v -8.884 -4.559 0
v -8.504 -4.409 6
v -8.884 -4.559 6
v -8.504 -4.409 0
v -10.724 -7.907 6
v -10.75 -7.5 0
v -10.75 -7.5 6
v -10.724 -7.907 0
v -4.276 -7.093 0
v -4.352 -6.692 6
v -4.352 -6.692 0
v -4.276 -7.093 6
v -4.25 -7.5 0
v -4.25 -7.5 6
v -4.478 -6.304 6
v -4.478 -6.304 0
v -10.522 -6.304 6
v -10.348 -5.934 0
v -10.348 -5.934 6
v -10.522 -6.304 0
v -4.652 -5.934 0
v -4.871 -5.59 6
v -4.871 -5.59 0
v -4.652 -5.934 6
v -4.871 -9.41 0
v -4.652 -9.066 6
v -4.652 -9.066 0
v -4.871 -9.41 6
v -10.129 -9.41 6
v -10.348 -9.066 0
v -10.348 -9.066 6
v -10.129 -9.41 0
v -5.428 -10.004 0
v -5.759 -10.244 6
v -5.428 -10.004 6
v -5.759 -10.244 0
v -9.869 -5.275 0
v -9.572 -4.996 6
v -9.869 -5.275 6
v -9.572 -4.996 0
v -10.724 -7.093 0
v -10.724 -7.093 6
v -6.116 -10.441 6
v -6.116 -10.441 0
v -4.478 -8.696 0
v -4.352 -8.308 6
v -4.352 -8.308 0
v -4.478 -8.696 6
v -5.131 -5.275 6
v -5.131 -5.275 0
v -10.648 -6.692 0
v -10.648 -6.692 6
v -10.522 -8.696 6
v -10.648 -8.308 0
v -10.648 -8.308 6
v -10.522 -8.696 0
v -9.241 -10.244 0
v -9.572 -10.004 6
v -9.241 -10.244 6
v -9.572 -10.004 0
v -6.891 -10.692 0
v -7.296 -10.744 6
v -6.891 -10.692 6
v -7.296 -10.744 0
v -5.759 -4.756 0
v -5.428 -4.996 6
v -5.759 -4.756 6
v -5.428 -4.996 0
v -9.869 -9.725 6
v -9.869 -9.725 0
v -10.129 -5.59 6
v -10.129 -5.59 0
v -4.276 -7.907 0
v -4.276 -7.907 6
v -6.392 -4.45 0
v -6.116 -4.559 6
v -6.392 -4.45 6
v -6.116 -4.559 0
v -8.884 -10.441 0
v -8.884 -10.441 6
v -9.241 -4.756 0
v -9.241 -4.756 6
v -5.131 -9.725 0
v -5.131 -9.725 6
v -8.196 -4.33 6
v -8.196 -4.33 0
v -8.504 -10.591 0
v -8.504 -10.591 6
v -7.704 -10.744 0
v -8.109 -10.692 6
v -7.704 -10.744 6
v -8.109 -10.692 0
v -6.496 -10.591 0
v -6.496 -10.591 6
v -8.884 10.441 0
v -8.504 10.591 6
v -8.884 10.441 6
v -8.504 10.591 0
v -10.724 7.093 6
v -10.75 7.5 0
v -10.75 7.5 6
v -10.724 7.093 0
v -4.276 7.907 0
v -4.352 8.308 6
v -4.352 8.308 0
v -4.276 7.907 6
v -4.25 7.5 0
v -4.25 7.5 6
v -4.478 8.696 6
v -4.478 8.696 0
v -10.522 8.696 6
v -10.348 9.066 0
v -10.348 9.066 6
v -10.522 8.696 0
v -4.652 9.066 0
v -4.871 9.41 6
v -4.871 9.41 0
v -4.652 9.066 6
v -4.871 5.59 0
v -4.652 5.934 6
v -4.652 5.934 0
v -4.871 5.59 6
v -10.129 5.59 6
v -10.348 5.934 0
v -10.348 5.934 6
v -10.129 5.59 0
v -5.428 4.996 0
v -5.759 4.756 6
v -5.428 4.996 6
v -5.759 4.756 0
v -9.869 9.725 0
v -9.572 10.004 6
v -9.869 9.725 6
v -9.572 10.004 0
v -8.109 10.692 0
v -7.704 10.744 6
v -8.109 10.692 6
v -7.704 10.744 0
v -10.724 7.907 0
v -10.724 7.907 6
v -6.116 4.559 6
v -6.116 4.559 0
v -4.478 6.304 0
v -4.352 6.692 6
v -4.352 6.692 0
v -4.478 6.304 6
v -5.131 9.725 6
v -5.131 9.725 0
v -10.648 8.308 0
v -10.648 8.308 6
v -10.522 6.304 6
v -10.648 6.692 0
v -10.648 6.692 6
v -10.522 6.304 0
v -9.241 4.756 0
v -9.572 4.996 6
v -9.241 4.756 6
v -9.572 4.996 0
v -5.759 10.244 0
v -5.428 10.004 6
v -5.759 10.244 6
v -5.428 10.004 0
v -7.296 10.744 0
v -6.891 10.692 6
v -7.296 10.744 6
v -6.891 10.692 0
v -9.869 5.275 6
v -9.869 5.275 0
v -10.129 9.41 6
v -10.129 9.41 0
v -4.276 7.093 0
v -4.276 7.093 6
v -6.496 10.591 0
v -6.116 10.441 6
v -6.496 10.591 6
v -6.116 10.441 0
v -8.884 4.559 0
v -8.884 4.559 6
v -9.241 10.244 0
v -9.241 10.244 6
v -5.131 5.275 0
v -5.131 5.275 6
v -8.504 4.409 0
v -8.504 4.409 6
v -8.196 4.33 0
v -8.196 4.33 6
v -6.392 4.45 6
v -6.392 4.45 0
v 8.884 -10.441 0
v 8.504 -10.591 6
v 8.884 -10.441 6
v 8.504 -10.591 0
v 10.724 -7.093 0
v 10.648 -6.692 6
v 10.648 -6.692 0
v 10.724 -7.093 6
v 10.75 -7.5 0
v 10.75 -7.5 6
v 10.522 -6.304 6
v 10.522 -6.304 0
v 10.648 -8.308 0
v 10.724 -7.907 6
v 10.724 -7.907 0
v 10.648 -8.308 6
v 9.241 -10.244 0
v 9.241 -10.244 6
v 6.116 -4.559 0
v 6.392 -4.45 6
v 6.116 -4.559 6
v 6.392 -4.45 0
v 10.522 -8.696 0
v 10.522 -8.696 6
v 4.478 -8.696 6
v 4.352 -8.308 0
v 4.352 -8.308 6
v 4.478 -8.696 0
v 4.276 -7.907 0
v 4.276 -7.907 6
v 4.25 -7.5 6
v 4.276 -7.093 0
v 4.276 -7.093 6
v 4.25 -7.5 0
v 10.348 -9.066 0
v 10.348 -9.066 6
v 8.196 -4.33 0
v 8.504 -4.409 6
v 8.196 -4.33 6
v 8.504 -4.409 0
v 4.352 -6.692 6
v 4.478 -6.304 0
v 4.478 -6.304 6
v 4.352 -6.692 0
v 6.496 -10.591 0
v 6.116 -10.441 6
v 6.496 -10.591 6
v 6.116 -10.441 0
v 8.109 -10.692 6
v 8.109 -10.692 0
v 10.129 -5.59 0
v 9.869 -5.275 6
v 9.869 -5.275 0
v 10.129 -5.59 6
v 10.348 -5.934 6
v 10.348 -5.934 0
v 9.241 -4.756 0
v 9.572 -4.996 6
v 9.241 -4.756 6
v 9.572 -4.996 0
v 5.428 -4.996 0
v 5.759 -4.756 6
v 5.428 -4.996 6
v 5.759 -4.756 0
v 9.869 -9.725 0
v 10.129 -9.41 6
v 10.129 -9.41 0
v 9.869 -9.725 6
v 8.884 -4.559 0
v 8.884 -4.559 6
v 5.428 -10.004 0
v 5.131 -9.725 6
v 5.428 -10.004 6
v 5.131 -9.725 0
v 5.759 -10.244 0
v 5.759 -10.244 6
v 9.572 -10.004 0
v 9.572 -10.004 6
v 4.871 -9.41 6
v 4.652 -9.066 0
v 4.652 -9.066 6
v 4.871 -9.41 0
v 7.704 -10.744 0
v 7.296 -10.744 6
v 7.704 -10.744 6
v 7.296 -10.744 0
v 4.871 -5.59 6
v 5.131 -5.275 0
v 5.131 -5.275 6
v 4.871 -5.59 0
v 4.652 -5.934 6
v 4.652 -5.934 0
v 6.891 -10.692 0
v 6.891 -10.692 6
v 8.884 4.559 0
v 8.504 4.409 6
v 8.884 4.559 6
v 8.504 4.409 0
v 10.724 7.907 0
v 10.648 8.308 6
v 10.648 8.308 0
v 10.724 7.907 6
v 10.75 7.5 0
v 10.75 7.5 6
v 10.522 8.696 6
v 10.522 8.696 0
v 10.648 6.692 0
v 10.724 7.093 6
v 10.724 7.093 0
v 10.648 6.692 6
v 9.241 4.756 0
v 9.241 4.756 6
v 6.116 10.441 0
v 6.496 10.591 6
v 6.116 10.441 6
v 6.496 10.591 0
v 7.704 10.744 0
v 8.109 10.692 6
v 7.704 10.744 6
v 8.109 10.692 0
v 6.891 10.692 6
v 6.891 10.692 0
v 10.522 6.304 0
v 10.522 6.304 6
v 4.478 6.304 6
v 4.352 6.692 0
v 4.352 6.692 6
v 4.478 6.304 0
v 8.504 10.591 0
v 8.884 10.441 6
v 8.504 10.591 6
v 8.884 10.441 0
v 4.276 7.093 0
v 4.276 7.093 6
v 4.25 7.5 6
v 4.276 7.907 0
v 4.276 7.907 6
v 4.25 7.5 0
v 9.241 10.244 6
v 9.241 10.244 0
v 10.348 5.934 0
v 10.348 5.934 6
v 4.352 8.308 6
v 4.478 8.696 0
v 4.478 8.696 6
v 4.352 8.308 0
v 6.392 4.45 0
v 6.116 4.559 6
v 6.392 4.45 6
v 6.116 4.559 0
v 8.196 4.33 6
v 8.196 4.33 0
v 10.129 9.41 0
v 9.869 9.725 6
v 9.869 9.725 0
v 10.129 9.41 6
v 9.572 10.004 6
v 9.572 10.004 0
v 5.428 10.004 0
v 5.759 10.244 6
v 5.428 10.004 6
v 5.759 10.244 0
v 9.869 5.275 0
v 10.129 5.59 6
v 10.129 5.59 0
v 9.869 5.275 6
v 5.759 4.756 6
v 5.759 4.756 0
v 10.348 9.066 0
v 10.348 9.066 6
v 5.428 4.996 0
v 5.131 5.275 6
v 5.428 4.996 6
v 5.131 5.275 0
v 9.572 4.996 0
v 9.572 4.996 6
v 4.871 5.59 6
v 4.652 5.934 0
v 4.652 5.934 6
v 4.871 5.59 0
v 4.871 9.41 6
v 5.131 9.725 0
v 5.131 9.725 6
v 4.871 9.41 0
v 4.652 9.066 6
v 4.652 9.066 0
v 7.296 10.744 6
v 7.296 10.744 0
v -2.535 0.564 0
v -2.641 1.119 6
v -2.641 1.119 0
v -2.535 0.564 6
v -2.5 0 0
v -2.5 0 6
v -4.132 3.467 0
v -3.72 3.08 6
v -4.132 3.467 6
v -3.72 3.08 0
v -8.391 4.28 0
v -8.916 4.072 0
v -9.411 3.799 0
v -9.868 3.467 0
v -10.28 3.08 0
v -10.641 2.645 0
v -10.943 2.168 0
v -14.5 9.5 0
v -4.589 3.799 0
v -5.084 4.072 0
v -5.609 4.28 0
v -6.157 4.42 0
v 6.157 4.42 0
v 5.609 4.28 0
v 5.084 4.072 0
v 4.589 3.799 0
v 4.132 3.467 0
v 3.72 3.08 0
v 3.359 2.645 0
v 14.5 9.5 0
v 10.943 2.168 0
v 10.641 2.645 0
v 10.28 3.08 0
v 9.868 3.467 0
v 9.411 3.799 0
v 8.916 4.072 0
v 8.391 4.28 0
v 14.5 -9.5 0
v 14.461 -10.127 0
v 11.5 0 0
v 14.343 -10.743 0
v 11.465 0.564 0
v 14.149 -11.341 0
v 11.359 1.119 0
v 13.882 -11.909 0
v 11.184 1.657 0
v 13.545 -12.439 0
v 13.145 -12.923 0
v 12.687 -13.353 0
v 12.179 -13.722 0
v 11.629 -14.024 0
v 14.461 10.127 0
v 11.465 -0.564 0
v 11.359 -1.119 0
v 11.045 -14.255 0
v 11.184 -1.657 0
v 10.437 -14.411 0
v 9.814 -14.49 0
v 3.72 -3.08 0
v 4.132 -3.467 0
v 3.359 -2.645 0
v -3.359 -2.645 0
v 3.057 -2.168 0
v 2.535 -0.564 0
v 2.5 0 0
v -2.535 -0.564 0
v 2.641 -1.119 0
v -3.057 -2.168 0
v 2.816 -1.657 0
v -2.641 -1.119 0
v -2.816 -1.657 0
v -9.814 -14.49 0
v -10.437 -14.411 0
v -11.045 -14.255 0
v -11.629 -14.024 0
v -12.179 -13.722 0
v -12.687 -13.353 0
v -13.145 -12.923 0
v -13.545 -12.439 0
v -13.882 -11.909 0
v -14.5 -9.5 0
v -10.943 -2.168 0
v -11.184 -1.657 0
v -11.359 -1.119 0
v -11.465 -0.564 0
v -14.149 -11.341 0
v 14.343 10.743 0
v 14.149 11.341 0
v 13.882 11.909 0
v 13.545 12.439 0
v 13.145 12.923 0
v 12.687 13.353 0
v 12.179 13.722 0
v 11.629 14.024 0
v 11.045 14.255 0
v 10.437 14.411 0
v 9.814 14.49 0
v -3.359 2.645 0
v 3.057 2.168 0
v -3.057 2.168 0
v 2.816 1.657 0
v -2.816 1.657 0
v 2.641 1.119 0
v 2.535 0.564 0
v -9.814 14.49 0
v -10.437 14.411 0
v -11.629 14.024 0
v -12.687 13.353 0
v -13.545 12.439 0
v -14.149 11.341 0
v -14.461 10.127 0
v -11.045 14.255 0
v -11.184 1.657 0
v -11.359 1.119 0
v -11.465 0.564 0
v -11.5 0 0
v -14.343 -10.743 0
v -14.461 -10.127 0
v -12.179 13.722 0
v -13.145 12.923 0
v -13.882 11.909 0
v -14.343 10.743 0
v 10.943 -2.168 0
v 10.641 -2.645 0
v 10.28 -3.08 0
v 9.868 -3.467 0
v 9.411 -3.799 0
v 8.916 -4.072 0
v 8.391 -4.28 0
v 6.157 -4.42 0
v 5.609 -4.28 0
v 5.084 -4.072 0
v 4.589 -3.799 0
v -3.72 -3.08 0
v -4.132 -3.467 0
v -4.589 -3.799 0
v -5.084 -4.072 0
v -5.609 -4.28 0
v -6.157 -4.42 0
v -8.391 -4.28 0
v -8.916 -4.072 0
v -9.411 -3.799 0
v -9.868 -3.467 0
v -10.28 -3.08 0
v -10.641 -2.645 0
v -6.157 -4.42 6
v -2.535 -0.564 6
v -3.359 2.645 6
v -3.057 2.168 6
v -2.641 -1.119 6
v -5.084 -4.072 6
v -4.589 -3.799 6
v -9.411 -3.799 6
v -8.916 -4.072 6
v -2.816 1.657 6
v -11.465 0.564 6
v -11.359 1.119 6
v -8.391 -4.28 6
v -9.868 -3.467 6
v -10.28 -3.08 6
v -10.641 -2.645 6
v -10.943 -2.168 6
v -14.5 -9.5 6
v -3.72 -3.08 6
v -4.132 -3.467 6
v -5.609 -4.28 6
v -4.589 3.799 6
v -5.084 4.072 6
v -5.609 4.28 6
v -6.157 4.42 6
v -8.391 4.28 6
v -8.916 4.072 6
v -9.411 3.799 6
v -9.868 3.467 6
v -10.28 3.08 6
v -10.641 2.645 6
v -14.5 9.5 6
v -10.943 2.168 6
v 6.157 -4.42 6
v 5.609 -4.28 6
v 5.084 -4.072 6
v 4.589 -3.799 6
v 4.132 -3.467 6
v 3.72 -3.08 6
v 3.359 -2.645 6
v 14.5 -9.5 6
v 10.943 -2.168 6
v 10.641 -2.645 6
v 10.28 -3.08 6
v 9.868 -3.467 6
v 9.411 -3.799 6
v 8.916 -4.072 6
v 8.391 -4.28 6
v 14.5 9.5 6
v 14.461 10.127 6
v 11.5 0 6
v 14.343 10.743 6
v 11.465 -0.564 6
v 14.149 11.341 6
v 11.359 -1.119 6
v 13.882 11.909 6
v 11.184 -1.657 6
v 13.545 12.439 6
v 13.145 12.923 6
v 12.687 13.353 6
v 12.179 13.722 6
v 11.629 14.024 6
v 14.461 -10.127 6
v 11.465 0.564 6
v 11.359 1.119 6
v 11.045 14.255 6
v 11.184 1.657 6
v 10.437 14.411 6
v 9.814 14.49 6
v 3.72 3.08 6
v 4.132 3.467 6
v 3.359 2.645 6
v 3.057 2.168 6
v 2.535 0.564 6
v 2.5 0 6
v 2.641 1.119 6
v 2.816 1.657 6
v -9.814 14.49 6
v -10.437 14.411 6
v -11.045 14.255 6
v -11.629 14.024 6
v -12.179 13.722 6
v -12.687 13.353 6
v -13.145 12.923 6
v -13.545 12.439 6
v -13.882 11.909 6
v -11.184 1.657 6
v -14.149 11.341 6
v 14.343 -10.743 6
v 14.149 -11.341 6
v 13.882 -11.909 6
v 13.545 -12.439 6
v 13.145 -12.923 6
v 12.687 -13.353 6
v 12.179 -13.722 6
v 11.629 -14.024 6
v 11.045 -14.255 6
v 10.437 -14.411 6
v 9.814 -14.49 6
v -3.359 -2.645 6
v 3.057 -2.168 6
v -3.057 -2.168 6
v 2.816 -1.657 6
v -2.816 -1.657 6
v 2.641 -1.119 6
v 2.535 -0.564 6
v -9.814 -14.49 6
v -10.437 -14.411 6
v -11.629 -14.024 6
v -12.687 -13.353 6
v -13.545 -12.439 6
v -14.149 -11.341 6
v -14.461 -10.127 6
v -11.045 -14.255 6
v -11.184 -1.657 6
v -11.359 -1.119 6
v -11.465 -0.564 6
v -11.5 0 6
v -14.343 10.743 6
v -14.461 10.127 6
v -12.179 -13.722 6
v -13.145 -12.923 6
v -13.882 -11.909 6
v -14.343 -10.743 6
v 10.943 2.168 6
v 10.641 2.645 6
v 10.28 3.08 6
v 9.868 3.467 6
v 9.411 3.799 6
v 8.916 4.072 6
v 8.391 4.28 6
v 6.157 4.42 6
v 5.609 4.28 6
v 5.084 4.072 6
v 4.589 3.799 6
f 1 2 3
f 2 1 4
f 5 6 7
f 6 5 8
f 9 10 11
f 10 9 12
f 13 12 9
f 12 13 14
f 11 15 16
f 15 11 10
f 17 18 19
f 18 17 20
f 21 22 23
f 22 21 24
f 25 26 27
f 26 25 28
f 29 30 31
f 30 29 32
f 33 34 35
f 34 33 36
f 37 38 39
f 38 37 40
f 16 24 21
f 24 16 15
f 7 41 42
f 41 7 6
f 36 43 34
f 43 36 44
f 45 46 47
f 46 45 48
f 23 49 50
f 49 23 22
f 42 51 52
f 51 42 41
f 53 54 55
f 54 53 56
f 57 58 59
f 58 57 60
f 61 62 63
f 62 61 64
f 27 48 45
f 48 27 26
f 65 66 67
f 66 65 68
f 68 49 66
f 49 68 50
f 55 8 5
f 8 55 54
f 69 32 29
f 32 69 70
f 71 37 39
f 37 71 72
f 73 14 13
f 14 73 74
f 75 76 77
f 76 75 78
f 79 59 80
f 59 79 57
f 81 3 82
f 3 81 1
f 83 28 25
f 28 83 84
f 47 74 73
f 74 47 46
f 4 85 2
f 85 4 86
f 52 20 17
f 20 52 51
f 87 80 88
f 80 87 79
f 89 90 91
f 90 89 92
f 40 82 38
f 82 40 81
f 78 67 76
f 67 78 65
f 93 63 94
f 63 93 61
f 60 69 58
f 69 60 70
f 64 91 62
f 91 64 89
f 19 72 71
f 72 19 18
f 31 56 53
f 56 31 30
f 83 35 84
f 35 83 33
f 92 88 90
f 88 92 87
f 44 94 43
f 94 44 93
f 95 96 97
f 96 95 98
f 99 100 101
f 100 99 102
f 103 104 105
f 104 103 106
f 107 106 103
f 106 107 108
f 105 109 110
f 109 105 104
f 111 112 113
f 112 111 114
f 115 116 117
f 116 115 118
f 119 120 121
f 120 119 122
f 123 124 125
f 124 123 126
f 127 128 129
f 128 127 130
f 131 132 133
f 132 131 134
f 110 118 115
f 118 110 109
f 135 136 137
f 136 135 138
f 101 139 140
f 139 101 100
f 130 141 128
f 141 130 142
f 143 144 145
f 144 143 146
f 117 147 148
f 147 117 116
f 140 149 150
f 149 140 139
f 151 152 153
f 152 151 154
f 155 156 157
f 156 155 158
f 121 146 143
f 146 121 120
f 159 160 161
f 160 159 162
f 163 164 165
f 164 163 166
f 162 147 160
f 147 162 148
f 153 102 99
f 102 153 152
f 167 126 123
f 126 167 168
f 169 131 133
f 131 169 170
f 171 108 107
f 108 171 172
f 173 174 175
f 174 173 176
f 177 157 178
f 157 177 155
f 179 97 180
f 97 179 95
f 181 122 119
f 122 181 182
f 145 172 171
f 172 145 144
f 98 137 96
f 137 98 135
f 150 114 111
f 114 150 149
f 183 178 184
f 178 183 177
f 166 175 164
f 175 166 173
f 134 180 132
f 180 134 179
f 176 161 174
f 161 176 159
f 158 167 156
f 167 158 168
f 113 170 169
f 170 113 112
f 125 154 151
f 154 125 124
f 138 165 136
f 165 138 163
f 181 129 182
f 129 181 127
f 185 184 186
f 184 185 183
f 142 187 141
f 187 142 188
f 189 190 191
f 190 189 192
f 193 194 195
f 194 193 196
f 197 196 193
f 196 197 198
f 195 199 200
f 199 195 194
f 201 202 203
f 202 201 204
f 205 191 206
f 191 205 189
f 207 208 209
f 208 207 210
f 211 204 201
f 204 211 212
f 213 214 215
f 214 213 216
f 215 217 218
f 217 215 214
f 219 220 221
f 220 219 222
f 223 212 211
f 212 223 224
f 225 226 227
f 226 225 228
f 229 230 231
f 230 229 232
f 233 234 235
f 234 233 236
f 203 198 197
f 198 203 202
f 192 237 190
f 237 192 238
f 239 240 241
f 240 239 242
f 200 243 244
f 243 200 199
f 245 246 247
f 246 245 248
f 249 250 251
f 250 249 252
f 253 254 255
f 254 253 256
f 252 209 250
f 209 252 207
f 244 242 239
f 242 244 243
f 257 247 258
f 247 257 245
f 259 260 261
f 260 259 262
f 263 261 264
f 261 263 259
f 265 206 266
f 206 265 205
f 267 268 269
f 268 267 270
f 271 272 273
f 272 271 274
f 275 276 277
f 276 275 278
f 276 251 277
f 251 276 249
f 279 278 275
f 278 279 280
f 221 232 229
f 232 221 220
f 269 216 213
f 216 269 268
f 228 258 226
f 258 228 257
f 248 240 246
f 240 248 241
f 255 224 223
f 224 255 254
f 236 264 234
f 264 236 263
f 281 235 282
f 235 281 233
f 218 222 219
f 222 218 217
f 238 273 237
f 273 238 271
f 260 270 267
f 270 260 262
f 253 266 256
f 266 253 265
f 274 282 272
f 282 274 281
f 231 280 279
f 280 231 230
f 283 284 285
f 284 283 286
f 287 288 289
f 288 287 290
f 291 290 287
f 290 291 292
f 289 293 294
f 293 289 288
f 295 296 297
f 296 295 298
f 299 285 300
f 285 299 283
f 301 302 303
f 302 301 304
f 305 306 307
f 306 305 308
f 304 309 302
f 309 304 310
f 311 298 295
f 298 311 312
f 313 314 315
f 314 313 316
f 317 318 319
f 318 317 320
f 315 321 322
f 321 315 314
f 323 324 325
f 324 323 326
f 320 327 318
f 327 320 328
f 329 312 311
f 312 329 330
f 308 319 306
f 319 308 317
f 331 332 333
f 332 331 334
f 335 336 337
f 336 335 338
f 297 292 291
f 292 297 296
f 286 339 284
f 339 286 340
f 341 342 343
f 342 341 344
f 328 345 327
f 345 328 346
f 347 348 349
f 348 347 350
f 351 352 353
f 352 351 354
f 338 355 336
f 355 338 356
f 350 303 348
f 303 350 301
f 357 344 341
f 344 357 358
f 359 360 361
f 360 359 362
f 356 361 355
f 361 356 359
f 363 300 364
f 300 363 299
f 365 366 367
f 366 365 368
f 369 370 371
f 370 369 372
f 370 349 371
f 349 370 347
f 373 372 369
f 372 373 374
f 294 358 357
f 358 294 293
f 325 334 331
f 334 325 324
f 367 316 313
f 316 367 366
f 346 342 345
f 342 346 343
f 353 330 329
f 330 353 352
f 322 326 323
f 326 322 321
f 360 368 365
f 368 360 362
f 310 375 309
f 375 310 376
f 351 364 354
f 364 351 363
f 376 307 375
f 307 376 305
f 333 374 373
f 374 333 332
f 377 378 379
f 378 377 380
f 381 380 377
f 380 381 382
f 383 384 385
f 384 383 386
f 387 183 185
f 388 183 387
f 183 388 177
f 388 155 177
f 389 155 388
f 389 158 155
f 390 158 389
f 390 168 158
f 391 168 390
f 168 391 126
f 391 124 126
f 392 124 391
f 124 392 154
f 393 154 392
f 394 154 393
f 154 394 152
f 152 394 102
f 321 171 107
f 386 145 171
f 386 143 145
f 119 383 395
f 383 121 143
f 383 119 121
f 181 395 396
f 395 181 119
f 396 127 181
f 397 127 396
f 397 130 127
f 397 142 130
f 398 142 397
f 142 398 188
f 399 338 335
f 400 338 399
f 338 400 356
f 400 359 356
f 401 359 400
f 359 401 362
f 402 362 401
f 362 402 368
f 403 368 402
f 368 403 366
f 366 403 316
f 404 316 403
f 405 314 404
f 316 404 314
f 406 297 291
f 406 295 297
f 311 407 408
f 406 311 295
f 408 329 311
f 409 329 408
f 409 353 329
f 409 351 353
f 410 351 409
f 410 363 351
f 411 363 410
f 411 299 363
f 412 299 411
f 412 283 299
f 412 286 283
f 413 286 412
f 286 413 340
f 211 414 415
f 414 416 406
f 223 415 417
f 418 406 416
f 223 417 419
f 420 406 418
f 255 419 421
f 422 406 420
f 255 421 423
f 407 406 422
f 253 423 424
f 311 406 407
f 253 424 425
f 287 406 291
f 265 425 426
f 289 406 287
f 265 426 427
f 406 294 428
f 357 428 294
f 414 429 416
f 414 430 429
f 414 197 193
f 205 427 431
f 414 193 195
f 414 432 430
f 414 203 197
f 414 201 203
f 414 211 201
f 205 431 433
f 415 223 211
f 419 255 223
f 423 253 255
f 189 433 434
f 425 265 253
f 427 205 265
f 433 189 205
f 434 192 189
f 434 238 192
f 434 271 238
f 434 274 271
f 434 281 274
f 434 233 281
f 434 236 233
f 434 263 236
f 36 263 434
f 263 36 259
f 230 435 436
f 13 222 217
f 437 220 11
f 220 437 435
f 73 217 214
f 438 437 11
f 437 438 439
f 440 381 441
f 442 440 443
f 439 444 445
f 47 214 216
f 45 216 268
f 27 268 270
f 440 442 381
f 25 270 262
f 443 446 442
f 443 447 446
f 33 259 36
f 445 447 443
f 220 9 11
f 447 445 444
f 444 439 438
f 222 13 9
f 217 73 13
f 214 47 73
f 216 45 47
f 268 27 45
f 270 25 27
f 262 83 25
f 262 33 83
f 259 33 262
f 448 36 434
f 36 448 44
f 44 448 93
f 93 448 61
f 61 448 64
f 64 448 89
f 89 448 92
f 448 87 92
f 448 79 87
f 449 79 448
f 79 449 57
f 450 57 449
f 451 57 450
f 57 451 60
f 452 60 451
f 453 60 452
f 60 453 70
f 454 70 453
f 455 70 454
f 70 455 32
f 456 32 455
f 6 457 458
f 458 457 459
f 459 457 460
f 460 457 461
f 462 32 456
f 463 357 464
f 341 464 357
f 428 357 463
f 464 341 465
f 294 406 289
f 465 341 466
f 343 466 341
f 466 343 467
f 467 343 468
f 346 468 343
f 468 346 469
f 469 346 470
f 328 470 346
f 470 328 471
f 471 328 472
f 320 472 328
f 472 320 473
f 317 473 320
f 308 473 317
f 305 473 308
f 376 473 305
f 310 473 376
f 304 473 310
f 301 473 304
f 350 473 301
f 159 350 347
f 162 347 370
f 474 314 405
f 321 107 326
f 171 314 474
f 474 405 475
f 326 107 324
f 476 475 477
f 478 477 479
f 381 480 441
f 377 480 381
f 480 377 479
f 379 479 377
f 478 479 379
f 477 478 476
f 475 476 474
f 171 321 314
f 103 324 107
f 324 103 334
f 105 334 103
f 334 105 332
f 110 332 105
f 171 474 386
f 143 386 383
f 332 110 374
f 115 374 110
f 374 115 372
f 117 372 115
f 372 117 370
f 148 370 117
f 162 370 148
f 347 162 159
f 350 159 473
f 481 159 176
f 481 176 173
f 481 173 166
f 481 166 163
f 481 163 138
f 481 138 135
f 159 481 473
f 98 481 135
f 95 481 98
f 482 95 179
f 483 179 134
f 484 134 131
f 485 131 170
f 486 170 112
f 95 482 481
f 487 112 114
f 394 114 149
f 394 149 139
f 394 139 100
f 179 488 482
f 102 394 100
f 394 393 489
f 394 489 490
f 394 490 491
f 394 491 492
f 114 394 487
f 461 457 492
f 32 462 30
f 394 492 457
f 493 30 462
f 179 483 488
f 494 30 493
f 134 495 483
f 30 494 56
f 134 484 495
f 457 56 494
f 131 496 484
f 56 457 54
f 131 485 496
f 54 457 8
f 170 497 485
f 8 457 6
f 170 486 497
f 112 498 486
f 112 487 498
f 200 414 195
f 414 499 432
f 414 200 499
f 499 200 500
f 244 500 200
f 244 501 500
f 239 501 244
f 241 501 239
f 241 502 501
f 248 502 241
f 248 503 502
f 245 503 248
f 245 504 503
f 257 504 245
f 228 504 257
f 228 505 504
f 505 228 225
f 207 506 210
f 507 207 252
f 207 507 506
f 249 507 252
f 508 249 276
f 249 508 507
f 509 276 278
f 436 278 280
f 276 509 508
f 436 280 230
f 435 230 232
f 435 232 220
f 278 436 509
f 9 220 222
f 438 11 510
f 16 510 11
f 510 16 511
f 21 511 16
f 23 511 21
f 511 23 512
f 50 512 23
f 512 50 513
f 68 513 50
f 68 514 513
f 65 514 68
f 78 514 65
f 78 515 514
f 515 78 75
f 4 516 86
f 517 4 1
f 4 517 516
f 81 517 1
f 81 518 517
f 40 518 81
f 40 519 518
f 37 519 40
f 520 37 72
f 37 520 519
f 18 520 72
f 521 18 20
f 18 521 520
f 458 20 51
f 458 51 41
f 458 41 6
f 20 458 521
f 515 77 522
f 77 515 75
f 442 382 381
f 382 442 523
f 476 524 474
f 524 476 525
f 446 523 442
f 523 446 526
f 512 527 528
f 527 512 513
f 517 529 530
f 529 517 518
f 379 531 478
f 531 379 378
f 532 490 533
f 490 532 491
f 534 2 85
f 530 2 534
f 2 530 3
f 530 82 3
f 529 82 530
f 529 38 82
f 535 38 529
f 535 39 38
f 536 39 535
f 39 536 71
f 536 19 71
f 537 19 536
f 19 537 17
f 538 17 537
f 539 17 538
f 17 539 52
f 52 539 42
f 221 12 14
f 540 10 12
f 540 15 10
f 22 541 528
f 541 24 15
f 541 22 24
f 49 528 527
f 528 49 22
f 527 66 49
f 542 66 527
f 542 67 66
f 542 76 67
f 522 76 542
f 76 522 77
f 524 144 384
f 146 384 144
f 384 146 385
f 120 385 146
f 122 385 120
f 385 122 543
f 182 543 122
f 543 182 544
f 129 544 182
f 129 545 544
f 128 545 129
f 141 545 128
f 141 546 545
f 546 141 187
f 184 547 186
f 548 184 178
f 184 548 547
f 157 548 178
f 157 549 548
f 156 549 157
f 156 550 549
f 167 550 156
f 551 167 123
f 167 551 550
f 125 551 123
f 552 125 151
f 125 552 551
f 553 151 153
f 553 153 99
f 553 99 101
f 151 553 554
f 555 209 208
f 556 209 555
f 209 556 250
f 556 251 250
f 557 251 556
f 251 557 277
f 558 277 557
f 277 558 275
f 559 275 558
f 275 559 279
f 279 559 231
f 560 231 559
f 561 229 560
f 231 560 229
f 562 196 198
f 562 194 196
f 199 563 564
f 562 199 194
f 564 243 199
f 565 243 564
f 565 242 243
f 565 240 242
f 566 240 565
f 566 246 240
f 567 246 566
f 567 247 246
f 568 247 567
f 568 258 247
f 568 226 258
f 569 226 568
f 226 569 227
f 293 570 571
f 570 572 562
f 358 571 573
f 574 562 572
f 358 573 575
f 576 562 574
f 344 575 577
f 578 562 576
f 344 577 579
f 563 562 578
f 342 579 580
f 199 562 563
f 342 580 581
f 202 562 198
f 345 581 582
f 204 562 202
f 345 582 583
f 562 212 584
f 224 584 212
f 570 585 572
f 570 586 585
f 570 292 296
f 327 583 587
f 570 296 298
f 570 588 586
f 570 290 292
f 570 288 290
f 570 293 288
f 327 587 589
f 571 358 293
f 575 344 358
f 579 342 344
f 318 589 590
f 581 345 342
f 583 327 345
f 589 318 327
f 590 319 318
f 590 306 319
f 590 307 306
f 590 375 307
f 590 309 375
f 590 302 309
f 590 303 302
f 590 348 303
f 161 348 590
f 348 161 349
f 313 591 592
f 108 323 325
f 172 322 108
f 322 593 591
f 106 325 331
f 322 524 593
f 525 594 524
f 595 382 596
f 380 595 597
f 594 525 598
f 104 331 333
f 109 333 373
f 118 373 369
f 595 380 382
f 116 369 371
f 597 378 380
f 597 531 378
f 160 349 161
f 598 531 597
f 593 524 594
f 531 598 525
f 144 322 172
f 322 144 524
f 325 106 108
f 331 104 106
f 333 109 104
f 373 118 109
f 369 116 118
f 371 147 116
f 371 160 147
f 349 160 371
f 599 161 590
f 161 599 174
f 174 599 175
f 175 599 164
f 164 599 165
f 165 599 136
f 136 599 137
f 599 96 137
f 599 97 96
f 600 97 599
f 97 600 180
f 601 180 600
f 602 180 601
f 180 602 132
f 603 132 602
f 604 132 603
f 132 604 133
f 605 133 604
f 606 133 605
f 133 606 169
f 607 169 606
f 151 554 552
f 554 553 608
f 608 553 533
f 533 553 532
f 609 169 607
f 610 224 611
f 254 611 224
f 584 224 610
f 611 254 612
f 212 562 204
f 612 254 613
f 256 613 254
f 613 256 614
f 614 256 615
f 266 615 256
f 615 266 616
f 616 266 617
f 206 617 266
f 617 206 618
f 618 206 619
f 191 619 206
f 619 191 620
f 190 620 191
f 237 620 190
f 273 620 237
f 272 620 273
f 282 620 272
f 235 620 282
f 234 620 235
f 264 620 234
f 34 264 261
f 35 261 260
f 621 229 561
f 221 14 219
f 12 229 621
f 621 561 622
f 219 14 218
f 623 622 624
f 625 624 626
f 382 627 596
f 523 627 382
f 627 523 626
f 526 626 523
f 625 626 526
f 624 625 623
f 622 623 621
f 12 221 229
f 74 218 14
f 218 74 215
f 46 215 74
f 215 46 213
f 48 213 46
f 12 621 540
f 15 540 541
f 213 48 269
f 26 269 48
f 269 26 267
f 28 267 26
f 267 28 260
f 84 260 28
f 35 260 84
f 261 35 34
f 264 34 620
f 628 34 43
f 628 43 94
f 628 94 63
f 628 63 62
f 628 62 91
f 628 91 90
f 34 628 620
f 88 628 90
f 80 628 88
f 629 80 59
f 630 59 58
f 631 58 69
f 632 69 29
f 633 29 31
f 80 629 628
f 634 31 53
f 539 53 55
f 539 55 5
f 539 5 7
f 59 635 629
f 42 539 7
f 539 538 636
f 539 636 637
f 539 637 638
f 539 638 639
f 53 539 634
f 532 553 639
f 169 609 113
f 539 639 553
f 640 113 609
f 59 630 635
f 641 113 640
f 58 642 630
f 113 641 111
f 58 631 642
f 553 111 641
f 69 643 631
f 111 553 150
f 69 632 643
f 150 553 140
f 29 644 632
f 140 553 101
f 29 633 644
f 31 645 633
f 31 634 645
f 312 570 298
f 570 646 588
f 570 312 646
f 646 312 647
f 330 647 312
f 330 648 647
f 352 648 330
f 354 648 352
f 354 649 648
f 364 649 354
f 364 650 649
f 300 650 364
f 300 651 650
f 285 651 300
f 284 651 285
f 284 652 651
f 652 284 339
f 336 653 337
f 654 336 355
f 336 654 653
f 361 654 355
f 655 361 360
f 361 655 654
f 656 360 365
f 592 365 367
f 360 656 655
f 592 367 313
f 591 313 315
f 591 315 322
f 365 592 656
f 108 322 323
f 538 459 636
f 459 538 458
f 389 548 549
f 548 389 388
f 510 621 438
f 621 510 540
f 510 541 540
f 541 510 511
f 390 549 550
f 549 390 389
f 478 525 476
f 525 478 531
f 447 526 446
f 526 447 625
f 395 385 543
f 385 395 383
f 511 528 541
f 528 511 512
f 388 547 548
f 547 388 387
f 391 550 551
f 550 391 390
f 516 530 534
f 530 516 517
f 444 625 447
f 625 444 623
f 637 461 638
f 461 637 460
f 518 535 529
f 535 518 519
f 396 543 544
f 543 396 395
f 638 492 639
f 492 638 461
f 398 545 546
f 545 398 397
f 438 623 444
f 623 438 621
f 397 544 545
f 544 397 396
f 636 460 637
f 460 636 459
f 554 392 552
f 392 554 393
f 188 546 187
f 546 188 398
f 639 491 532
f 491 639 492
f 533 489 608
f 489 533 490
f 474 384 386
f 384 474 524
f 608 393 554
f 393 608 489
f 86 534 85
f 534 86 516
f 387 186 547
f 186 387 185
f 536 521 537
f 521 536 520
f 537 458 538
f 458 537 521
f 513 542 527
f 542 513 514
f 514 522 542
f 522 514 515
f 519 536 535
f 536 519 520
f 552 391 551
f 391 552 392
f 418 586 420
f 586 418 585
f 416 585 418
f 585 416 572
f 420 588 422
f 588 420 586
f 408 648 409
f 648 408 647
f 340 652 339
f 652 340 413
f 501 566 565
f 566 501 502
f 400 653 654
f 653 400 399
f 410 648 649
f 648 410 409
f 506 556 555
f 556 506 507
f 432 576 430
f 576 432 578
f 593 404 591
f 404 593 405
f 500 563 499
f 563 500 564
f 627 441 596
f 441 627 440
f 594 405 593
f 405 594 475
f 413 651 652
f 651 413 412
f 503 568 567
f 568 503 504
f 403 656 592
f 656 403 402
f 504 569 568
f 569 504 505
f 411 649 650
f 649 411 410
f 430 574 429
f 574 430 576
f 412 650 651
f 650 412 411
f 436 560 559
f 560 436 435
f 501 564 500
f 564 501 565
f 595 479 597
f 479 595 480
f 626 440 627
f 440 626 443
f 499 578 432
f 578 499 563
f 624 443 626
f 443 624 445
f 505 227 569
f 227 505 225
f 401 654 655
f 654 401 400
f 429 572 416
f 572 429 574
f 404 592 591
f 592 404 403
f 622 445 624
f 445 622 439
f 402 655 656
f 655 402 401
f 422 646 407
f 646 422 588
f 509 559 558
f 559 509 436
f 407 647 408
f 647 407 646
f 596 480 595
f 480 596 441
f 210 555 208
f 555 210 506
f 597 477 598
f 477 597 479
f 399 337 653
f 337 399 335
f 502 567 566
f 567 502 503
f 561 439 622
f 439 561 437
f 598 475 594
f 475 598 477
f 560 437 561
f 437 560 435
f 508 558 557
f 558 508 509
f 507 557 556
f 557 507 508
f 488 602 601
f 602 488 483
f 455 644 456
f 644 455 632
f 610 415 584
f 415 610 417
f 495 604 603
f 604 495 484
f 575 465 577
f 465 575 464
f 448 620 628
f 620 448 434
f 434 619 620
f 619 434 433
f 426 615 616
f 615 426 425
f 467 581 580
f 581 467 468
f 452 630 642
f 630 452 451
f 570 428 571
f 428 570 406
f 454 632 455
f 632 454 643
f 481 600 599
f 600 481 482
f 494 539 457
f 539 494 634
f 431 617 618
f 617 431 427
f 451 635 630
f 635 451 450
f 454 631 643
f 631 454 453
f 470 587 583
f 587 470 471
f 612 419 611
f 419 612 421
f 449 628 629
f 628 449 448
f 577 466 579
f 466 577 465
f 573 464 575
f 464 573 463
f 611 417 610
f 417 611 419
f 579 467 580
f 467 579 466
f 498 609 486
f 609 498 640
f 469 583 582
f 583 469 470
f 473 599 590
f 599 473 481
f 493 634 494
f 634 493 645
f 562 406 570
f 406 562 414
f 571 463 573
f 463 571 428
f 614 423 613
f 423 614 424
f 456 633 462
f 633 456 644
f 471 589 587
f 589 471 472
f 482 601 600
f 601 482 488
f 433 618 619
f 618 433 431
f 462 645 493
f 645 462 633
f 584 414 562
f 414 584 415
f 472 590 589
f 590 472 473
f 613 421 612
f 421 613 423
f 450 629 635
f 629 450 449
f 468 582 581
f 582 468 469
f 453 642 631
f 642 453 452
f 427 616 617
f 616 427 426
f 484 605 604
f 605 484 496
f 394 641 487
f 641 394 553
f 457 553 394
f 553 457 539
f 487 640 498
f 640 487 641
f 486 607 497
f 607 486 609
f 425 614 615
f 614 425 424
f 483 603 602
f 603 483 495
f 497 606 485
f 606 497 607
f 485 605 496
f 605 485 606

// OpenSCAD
$fn = 50;

difference() {
	union() {
		hull() {
			translate(v = [-9.5, 9.5, 0]) {
				cylinder(h = 6, r = 5);
			}
			translate(v = [9.5, 9.5, 0]) {
				cylinder(h = 6, r = 5);
			}
			translate(v = [-9.5, -9.5, 0]) {
				cylinder(h = 6, r = 5);
			}
			translate(v = [9.5, -9.5, 0]) {
				cylinder(h = 6, r = 5);
			}
		}
	}
	union() {
		translate(v = [-7.5, -7.5, -100.0]) {
			cylinder(h = 200, r = 3.25);
		}
		translate(v = [-7.5, 7.5, -100.0]) {
			cylinder(h = 200, r = 3.25);
		}
		translate(v = [7.5, -7.5, -100.0]) {
			cylinder(h = 200, r = 3.25);
		}
		translate(v = [7.5, 7.5, -100.0]) {
			cylinder(h = 200, r = 3.25);
		}
		translate(v = [-7.5, -7.5, -100.0]) {
			cylinder(h = 200, r = 1.8);
		}
		translate(v = [-7.5, 7.5, -100.0]) {
			cylinder(h = 200, r = 1.8);
		}
		translate(v = [7.5, -7.5, -100.0]) {
			cylinder(h = 200, r = 1.8);
		}
		translate(v = [7.5, 7.5, -100.0]) {
			cylinder(h = 200, r = 1.8);
		}
		translate(v = [-7.0, 0, 0.0]) {
			cylinder(h = 6, r = 4.5);
		}
		translate(v = [7.0, 0, 0.0]) {
			cylinder(h = 6, r = 4.5);
		}
	}
}
